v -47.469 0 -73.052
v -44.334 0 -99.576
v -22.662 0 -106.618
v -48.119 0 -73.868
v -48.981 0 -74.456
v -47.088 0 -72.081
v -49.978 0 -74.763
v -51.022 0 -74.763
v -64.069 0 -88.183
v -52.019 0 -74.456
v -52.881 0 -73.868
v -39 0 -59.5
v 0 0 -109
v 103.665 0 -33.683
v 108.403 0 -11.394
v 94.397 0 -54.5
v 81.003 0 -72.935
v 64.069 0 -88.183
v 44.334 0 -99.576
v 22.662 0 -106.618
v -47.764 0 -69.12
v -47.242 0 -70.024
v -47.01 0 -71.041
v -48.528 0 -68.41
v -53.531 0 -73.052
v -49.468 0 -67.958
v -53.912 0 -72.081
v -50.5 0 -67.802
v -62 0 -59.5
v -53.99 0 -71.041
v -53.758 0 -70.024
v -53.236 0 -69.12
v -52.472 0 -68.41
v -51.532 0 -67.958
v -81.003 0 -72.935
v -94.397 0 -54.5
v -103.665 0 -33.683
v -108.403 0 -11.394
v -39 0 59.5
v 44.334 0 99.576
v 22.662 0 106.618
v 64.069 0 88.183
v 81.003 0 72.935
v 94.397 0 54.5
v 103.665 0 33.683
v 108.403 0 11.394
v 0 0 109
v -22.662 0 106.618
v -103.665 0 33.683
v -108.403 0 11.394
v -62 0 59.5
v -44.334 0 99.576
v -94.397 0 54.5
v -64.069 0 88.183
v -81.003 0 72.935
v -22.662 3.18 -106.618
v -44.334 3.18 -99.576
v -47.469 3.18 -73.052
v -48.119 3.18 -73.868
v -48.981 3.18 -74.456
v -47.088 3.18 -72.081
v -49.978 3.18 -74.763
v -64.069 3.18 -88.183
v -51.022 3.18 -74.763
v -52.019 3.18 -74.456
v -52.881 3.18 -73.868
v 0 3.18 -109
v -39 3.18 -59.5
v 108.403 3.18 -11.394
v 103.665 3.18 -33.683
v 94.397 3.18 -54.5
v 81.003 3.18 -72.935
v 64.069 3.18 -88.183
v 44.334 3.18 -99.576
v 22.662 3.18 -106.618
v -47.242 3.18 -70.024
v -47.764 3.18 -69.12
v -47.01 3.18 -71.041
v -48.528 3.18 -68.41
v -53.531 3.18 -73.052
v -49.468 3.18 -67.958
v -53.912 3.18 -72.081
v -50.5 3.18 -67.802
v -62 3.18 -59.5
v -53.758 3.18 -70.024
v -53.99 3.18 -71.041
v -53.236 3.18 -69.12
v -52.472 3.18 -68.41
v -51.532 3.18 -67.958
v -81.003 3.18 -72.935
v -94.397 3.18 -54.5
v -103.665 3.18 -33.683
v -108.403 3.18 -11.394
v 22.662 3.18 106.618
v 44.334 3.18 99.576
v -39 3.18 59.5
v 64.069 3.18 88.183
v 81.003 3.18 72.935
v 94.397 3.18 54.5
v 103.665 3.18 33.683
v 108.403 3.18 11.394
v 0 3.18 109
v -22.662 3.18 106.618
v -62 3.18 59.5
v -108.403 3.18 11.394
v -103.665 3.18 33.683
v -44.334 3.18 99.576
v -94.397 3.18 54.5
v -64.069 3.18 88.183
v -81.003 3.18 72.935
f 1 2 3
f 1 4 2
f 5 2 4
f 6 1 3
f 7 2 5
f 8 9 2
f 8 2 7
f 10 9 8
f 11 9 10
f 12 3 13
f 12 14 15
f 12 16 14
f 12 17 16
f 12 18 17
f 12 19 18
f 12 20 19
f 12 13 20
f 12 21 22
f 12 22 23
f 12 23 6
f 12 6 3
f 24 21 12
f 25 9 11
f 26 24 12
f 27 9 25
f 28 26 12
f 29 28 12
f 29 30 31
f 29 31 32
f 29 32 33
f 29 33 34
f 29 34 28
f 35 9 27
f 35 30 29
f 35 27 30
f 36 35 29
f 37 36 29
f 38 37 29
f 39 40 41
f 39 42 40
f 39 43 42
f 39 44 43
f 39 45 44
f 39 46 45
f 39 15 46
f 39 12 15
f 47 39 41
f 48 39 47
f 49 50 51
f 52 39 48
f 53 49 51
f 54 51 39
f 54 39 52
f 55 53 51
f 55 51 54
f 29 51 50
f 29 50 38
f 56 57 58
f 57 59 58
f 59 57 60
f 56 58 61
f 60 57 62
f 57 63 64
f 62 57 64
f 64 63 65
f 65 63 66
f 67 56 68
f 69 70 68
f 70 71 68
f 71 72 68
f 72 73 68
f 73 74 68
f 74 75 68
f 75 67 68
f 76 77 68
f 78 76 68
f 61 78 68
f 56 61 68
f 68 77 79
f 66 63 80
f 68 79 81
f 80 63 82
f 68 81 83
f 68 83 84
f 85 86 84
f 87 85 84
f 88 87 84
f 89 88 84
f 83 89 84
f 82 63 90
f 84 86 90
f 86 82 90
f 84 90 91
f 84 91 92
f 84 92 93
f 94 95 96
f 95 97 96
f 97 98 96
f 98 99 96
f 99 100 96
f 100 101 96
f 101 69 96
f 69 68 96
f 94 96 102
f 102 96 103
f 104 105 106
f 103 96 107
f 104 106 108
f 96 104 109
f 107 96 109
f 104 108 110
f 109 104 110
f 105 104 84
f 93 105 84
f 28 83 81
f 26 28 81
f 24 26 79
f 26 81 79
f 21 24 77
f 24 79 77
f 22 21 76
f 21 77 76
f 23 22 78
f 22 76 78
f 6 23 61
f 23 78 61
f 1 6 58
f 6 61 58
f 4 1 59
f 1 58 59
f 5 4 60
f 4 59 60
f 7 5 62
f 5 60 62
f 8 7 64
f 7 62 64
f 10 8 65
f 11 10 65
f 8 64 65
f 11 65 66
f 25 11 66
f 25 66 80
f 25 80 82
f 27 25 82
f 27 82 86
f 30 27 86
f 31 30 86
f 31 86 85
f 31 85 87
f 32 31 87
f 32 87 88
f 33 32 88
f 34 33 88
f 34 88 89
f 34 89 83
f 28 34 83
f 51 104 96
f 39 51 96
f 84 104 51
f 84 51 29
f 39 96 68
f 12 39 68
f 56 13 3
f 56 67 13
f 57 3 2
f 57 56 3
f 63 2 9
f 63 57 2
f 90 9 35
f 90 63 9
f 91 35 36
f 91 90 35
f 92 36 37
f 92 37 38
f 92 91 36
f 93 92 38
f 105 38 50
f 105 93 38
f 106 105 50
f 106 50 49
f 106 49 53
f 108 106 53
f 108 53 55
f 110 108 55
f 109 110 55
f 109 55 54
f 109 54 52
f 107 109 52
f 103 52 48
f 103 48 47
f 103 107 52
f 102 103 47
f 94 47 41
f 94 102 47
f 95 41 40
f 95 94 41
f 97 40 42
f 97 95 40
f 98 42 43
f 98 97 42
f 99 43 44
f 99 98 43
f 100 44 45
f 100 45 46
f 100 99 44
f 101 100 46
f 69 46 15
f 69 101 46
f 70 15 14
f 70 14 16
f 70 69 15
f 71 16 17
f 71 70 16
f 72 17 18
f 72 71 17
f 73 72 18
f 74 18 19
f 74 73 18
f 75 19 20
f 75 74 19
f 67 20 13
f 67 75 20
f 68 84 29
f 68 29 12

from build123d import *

# Parameters (mm, degrees)
SKETCH1_W          = 109
SKETCH1_H          = 3.18
SKETCH2_R          = 3.5
SKETCH2_W          = 23
SKETCH2_H          = 119
CUT_EXTRUDE1_DEPTH = 155.182075482


with BuildPart() as part:
    # Sketch1 → Revolve1 (revolve)
    with BuildSketch(Plane.XY, mode=Mode.PRIVATE) as revolve1_sk:
        with Locations((54.5, 1.59)):
            Rectangle(SKETCH1_W, SKETCH1_H)
    revolve(revolve1_sk.sketch.rotate(Axis((0, 4.511025306, 0), (0, 1, 0)), 90), axis=Axis((0, 4.511025306, 0), (0, 1, 0)))

    # Sketch2 → Cut-Extrude1 (cut, through all)
    with BuildSketch(Plane(origin=(0, 3.18, 0), x_dir=(1, 0, 0), z_dir=(0, 1, 0))):
        with Locations(Location((-50.5, 71.302237886, 0), (0, 0, 270))):
            Circle(SKETCH2_R)
        with Locations((-50.5, 0)):
            Rectangle(SKETCH2_W, SKETCH2_H)
    extrude(amount=-CUT_EXTRUDE1_DEPTH, mode=Mode.SUBTRACT)


solid = part.part
